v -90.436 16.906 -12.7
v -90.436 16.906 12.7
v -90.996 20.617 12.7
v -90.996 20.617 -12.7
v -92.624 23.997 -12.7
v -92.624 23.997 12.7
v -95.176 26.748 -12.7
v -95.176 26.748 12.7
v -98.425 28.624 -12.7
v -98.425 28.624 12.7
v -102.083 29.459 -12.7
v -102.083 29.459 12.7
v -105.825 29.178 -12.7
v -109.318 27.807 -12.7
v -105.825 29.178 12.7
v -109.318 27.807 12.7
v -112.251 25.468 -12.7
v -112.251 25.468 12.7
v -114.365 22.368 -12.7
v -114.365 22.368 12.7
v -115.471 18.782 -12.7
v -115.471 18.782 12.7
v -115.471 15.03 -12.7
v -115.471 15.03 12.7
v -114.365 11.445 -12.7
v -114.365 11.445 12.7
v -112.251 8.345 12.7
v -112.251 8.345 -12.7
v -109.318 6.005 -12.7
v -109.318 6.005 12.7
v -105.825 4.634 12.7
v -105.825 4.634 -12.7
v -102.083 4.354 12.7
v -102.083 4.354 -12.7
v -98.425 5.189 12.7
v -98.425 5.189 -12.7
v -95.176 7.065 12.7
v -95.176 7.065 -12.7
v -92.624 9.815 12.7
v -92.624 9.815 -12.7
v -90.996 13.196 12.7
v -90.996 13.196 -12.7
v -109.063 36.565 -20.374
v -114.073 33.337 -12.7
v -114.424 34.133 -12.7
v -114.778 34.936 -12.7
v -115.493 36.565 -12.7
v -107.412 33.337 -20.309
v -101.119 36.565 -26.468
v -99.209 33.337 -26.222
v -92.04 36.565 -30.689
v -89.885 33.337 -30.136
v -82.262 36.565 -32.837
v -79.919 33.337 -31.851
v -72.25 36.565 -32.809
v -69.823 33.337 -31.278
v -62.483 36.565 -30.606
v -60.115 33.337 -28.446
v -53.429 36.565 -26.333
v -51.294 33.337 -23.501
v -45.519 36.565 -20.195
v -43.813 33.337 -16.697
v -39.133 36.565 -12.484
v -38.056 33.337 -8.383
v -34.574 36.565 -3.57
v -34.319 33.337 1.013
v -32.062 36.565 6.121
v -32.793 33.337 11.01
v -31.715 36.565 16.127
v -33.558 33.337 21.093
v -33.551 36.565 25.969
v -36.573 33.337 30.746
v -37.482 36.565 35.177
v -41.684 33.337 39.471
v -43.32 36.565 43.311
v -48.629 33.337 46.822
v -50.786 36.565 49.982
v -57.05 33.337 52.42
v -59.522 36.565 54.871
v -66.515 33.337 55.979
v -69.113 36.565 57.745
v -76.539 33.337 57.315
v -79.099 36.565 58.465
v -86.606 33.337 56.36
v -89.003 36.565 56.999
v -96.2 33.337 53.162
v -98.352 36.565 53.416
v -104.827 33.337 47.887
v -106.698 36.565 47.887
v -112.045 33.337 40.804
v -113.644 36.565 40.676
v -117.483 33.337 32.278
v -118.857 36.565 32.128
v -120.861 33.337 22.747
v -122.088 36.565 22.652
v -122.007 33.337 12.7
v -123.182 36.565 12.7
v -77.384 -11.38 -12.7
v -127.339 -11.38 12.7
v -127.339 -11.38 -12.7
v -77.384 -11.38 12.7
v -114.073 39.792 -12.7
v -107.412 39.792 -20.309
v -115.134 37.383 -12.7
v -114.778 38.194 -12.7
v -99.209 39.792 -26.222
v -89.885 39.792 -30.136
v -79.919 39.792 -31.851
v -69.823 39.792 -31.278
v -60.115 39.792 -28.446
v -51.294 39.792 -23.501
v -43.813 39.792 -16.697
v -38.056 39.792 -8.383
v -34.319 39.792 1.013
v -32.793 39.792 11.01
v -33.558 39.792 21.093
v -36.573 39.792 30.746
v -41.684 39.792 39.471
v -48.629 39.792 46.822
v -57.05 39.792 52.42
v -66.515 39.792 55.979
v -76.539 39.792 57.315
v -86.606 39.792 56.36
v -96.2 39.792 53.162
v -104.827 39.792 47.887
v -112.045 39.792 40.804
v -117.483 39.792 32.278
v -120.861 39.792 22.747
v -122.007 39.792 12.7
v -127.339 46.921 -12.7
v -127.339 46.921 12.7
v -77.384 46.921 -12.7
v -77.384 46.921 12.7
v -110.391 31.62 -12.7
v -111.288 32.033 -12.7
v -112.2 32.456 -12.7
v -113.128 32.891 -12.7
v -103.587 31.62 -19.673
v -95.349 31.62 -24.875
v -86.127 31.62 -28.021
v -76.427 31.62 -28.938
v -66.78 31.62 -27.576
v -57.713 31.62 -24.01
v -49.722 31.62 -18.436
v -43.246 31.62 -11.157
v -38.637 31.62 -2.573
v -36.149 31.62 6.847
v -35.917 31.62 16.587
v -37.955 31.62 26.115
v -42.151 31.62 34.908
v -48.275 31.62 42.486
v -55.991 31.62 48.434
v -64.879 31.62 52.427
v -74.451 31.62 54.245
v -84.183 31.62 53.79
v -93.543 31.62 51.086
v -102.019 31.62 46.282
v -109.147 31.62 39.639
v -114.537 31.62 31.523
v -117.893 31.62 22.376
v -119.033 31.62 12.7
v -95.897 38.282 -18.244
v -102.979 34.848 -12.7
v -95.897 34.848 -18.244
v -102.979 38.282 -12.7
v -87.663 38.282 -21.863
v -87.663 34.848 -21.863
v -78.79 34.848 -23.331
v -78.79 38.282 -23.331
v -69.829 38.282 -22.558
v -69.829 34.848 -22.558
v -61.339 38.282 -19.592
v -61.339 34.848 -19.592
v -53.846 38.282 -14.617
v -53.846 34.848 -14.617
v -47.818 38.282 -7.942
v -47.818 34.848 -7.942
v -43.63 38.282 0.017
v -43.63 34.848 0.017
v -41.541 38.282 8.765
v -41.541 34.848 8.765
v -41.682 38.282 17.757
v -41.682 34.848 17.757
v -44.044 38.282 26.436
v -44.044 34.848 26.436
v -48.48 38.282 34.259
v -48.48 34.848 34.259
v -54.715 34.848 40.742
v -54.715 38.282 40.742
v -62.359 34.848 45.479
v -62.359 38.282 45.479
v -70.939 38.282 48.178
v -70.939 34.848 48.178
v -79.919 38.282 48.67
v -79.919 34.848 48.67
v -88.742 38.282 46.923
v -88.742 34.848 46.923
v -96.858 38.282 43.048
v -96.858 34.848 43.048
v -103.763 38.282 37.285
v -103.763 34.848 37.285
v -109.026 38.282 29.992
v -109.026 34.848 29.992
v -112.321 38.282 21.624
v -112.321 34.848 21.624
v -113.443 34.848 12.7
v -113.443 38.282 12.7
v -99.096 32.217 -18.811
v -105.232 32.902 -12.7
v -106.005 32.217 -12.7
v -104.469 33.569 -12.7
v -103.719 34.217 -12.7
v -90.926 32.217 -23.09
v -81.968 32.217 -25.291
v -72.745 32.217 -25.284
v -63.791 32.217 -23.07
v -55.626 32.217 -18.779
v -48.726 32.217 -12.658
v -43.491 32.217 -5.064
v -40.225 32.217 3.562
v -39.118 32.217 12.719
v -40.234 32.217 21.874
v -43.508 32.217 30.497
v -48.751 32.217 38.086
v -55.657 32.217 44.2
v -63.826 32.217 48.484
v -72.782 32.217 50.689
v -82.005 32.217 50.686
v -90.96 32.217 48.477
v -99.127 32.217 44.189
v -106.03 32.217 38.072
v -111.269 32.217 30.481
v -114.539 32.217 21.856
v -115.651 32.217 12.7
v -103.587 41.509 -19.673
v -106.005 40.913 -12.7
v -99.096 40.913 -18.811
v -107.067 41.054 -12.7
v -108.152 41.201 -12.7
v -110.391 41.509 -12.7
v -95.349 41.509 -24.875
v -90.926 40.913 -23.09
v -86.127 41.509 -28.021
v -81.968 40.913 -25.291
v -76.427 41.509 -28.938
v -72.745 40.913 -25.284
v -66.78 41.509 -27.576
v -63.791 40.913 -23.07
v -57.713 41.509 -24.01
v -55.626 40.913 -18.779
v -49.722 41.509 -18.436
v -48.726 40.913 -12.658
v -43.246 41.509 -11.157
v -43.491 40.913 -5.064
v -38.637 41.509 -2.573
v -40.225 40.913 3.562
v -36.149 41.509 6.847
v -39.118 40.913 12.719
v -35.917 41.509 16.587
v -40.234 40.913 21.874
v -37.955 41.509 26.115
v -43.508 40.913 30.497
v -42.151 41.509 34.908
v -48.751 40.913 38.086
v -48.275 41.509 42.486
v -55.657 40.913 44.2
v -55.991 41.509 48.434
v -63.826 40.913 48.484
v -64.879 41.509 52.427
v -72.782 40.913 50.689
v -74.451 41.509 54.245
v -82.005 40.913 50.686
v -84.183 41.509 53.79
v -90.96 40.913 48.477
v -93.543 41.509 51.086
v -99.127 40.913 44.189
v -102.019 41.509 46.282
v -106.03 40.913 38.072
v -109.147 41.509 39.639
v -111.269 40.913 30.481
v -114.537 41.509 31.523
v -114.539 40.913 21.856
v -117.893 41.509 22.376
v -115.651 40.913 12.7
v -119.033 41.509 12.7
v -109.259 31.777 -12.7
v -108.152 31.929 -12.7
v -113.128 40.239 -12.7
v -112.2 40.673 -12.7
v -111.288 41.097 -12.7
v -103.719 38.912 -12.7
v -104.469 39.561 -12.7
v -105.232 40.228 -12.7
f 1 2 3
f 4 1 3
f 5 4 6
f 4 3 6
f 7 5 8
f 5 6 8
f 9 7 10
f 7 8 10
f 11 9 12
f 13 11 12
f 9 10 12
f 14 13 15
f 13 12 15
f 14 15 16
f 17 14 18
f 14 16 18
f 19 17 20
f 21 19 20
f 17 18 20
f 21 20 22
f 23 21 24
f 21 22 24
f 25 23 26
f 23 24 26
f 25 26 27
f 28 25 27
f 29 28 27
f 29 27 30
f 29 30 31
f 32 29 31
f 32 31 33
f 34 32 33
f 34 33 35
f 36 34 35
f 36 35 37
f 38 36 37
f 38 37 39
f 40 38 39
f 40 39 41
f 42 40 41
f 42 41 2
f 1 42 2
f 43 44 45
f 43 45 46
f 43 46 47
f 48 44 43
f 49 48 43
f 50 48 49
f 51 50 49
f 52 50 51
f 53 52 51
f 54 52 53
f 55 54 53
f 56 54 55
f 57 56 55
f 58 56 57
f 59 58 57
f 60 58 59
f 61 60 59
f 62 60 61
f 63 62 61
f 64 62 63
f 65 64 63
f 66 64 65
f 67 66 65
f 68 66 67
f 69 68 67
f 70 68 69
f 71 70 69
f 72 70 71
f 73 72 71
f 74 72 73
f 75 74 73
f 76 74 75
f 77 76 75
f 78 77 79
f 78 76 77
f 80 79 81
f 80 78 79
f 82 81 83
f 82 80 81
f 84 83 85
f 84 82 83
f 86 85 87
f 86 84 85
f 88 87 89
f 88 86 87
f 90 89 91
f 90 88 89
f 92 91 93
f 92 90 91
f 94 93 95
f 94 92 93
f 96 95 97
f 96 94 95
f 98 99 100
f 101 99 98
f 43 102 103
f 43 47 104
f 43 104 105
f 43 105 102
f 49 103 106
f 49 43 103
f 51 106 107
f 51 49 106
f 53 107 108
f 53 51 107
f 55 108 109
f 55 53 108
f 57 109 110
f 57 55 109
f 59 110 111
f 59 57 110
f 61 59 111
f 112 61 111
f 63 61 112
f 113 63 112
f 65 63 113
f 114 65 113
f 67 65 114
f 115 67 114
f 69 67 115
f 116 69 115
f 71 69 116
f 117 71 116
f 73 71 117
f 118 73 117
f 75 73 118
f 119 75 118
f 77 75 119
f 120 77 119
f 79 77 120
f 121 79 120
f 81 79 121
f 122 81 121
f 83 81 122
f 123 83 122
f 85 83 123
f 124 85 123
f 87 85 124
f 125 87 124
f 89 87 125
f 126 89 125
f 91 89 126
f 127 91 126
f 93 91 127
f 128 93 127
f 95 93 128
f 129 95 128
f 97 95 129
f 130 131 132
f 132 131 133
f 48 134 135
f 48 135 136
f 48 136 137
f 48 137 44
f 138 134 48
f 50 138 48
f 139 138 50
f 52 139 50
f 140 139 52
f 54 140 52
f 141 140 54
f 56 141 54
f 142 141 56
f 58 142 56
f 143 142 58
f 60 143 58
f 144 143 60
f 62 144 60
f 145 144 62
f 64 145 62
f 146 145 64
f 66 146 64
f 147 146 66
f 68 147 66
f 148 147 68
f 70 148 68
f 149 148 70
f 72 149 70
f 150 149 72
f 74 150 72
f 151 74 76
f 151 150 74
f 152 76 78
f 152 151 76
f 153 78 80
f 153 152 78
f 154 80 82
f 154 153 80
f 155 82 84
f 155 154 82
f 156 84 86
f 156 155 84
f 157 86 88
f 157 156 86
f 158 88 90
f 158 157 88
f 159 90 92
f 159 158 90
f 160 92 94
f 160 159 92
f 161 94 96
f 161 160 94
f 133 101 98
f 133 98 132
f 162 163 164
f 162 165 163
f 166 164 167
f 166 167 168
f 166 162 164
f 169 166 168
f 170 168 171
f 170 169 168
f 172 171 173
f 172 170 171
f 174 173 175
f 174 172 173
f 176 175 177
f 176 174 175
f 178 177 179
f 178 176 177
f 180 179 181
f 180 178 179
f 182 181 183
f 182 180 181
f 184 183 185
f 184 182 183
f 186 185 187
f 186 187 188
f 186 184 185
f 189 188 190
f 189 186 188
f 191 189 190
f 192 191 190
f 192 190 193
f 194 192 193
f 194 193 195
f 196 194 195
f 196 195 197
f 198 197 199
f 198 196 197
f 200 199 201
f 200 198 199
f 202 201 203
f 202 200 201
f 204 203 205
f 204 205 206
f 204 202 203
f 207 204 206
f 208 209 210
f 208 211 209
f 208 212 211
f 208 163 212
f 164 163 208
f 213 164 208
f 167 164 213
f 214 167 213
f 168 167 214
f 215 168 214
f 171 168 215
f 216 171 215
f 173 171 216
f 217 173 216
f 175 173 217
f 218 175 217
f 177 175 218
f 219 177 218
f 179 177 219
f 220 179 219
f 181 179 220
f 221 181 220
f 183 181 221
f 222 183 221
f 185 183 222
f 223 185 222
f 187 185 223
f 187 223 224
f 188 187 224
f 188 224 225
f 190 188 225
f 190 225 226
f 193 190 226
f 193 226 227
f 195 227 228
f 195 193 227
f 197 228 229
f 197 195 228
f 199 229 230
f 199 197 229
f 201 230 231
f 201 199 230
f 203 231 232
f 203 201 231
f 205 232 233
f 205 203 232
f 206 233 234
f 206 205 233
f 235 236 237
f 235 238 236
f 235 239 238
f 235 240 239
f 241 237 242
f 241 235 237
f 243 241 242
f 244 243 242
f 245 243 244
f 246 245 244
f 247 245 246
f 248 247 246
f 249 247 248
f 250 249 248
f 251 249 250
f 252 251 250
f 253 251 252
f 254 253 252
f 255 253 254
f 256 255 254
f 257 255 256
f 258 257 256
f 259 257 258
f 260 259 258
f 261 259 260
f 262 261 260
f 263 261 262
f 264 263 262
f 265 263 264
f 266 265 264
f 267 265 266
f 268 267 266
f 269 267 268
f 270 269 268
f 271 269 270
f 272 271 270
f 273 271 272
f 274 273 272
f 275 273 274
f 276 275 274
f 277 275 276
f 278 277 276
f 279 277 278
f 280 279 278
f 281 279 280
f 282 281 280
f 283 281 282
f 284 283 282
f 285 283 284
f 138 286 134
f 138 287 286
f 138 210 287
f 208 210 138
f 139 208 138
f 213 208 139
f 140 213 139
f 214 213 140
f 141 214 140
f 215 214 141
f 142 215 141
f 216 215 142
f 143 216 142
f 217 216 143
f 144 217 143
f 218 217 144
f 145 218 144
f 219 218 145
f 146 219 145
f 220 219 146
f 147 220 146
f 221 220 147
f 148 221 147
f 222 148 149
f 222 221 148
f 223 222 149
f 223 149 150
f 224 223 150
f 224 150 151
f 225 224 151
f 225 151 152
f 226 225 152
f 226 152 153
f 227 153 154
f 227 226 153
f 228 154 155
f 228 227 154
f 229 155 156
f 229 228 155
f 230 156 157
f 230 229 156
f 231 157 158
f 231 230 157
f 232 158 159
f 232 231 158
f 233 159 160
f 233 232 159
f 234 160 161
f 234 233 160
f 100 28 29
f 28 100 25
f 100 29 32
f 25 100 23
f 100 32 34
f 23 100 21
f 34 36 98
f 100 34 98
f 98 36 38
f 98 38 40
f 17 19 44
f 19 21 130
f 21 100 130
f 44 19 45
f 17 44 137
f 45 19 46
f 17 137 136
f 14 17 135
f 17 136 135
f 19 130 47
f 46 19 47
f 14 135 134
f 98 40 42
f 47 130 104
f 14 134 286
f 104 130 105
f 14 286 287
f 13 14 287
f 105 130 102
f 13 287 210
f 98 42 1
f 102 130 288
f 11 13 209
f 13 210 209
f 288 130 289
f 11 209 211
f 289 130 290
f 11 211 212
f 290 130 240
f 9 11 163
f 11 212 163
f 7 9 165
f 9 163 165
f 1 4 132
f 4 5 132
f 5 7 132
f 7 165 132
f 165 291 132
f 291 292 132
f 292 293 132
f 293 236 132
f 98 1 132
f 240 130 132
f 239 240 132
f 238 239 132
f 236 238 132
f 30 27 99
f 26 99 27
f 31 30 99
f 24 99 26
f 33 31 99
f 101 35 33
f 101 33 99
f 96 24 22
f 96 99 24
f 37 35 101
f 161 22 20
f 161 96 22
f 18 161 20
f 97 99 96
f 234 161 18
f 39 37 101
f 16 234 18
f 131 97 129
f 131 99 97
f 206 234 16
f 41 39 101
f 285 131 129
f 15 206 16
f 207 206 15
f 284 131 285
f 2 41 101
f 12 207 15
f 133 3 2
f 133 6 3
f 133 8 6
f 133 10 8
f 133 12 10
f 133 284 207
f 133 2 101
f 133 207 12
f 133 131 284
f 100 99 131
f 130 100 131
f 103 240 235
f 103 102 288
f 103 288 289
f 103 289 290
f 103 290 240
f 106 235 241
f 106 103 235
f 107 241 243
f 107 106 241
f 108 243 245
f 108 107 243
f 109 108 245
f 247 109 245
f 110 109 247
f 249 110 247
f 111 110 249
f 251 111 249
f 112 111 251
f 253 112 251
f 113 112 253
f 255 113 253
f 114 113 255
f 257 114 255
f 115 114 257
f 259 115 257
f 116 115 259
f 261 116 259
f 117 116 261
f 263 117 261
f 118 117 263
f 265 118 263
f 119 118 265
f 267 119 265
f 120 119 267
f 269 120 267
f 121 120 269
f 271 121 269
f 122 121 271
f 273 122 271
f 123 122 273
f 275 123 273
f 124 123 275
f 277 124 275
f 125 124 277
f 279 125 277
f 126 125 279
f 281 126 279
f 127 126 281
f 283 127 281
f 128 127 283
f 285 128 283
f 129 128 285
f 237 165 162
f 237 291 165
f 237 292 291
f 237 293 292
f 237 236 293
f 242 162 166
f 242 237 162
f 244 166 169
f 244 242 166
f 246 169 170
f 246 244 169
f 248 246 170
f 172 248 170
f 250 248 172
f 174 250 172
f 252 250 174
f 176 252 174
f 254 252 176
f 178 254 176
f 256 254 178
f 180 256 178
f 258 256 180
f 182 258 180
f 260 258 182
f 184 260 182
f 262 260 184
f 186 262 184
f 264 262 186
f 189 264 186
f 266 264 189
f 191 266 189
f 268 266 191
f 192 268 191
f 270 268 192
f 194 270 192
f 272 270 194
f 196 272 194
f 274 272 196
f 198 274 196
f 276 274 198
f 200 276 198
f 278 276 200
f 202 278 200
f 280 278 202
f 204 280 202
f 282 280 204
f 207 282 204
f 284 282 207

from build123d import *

# Parameters (mm, degrees)
F0_W     = 49.954958
F0_H     = 58.300882
F1_DEPTH = 12.7
F2_R     = 12.587568
F3_DEPTH = 25.401


with BuildPart() as f1:
    # F0 (on Top) → F1 (new body, symmetric)
    with BuildSketch(Plane.XY):
        with Locations((-102.361765, 17.77092)):
            Rectangle(F0_W, F0_H)
    extrude(amount=F1_DEPTH, both=True)

    # F2 (on face) → F3 (cut, through all)
    with BuildSketch(Plane.XY.offset(12.7)):
        with Locations((-103.024021, 16.906289)):
            Circle(F2_R)
    extrude(amount=-F3_DEPTH, mode=Mode.SUBTRACT)

    # F4 (on face) → F5 (revolve)
    with BuildSketch(Plane.XY.offset(12.7)):
        Polygon((-113.443017, 34.847543), (-113.443017, 38.281992), (-115.650638, 40.912932), (-119.03291, 41.509318), (-122.00723, 39.792094), (-123.181881, 36.564767), (-122.00723, 33.337441), (-119.03291, 31.620217), (-115.650638, 32.216602), align=None)
    revolve(axis=Axis((-77.384286, 17.77092, 12.7), (0, -1, 0)))


solid = f1.part
